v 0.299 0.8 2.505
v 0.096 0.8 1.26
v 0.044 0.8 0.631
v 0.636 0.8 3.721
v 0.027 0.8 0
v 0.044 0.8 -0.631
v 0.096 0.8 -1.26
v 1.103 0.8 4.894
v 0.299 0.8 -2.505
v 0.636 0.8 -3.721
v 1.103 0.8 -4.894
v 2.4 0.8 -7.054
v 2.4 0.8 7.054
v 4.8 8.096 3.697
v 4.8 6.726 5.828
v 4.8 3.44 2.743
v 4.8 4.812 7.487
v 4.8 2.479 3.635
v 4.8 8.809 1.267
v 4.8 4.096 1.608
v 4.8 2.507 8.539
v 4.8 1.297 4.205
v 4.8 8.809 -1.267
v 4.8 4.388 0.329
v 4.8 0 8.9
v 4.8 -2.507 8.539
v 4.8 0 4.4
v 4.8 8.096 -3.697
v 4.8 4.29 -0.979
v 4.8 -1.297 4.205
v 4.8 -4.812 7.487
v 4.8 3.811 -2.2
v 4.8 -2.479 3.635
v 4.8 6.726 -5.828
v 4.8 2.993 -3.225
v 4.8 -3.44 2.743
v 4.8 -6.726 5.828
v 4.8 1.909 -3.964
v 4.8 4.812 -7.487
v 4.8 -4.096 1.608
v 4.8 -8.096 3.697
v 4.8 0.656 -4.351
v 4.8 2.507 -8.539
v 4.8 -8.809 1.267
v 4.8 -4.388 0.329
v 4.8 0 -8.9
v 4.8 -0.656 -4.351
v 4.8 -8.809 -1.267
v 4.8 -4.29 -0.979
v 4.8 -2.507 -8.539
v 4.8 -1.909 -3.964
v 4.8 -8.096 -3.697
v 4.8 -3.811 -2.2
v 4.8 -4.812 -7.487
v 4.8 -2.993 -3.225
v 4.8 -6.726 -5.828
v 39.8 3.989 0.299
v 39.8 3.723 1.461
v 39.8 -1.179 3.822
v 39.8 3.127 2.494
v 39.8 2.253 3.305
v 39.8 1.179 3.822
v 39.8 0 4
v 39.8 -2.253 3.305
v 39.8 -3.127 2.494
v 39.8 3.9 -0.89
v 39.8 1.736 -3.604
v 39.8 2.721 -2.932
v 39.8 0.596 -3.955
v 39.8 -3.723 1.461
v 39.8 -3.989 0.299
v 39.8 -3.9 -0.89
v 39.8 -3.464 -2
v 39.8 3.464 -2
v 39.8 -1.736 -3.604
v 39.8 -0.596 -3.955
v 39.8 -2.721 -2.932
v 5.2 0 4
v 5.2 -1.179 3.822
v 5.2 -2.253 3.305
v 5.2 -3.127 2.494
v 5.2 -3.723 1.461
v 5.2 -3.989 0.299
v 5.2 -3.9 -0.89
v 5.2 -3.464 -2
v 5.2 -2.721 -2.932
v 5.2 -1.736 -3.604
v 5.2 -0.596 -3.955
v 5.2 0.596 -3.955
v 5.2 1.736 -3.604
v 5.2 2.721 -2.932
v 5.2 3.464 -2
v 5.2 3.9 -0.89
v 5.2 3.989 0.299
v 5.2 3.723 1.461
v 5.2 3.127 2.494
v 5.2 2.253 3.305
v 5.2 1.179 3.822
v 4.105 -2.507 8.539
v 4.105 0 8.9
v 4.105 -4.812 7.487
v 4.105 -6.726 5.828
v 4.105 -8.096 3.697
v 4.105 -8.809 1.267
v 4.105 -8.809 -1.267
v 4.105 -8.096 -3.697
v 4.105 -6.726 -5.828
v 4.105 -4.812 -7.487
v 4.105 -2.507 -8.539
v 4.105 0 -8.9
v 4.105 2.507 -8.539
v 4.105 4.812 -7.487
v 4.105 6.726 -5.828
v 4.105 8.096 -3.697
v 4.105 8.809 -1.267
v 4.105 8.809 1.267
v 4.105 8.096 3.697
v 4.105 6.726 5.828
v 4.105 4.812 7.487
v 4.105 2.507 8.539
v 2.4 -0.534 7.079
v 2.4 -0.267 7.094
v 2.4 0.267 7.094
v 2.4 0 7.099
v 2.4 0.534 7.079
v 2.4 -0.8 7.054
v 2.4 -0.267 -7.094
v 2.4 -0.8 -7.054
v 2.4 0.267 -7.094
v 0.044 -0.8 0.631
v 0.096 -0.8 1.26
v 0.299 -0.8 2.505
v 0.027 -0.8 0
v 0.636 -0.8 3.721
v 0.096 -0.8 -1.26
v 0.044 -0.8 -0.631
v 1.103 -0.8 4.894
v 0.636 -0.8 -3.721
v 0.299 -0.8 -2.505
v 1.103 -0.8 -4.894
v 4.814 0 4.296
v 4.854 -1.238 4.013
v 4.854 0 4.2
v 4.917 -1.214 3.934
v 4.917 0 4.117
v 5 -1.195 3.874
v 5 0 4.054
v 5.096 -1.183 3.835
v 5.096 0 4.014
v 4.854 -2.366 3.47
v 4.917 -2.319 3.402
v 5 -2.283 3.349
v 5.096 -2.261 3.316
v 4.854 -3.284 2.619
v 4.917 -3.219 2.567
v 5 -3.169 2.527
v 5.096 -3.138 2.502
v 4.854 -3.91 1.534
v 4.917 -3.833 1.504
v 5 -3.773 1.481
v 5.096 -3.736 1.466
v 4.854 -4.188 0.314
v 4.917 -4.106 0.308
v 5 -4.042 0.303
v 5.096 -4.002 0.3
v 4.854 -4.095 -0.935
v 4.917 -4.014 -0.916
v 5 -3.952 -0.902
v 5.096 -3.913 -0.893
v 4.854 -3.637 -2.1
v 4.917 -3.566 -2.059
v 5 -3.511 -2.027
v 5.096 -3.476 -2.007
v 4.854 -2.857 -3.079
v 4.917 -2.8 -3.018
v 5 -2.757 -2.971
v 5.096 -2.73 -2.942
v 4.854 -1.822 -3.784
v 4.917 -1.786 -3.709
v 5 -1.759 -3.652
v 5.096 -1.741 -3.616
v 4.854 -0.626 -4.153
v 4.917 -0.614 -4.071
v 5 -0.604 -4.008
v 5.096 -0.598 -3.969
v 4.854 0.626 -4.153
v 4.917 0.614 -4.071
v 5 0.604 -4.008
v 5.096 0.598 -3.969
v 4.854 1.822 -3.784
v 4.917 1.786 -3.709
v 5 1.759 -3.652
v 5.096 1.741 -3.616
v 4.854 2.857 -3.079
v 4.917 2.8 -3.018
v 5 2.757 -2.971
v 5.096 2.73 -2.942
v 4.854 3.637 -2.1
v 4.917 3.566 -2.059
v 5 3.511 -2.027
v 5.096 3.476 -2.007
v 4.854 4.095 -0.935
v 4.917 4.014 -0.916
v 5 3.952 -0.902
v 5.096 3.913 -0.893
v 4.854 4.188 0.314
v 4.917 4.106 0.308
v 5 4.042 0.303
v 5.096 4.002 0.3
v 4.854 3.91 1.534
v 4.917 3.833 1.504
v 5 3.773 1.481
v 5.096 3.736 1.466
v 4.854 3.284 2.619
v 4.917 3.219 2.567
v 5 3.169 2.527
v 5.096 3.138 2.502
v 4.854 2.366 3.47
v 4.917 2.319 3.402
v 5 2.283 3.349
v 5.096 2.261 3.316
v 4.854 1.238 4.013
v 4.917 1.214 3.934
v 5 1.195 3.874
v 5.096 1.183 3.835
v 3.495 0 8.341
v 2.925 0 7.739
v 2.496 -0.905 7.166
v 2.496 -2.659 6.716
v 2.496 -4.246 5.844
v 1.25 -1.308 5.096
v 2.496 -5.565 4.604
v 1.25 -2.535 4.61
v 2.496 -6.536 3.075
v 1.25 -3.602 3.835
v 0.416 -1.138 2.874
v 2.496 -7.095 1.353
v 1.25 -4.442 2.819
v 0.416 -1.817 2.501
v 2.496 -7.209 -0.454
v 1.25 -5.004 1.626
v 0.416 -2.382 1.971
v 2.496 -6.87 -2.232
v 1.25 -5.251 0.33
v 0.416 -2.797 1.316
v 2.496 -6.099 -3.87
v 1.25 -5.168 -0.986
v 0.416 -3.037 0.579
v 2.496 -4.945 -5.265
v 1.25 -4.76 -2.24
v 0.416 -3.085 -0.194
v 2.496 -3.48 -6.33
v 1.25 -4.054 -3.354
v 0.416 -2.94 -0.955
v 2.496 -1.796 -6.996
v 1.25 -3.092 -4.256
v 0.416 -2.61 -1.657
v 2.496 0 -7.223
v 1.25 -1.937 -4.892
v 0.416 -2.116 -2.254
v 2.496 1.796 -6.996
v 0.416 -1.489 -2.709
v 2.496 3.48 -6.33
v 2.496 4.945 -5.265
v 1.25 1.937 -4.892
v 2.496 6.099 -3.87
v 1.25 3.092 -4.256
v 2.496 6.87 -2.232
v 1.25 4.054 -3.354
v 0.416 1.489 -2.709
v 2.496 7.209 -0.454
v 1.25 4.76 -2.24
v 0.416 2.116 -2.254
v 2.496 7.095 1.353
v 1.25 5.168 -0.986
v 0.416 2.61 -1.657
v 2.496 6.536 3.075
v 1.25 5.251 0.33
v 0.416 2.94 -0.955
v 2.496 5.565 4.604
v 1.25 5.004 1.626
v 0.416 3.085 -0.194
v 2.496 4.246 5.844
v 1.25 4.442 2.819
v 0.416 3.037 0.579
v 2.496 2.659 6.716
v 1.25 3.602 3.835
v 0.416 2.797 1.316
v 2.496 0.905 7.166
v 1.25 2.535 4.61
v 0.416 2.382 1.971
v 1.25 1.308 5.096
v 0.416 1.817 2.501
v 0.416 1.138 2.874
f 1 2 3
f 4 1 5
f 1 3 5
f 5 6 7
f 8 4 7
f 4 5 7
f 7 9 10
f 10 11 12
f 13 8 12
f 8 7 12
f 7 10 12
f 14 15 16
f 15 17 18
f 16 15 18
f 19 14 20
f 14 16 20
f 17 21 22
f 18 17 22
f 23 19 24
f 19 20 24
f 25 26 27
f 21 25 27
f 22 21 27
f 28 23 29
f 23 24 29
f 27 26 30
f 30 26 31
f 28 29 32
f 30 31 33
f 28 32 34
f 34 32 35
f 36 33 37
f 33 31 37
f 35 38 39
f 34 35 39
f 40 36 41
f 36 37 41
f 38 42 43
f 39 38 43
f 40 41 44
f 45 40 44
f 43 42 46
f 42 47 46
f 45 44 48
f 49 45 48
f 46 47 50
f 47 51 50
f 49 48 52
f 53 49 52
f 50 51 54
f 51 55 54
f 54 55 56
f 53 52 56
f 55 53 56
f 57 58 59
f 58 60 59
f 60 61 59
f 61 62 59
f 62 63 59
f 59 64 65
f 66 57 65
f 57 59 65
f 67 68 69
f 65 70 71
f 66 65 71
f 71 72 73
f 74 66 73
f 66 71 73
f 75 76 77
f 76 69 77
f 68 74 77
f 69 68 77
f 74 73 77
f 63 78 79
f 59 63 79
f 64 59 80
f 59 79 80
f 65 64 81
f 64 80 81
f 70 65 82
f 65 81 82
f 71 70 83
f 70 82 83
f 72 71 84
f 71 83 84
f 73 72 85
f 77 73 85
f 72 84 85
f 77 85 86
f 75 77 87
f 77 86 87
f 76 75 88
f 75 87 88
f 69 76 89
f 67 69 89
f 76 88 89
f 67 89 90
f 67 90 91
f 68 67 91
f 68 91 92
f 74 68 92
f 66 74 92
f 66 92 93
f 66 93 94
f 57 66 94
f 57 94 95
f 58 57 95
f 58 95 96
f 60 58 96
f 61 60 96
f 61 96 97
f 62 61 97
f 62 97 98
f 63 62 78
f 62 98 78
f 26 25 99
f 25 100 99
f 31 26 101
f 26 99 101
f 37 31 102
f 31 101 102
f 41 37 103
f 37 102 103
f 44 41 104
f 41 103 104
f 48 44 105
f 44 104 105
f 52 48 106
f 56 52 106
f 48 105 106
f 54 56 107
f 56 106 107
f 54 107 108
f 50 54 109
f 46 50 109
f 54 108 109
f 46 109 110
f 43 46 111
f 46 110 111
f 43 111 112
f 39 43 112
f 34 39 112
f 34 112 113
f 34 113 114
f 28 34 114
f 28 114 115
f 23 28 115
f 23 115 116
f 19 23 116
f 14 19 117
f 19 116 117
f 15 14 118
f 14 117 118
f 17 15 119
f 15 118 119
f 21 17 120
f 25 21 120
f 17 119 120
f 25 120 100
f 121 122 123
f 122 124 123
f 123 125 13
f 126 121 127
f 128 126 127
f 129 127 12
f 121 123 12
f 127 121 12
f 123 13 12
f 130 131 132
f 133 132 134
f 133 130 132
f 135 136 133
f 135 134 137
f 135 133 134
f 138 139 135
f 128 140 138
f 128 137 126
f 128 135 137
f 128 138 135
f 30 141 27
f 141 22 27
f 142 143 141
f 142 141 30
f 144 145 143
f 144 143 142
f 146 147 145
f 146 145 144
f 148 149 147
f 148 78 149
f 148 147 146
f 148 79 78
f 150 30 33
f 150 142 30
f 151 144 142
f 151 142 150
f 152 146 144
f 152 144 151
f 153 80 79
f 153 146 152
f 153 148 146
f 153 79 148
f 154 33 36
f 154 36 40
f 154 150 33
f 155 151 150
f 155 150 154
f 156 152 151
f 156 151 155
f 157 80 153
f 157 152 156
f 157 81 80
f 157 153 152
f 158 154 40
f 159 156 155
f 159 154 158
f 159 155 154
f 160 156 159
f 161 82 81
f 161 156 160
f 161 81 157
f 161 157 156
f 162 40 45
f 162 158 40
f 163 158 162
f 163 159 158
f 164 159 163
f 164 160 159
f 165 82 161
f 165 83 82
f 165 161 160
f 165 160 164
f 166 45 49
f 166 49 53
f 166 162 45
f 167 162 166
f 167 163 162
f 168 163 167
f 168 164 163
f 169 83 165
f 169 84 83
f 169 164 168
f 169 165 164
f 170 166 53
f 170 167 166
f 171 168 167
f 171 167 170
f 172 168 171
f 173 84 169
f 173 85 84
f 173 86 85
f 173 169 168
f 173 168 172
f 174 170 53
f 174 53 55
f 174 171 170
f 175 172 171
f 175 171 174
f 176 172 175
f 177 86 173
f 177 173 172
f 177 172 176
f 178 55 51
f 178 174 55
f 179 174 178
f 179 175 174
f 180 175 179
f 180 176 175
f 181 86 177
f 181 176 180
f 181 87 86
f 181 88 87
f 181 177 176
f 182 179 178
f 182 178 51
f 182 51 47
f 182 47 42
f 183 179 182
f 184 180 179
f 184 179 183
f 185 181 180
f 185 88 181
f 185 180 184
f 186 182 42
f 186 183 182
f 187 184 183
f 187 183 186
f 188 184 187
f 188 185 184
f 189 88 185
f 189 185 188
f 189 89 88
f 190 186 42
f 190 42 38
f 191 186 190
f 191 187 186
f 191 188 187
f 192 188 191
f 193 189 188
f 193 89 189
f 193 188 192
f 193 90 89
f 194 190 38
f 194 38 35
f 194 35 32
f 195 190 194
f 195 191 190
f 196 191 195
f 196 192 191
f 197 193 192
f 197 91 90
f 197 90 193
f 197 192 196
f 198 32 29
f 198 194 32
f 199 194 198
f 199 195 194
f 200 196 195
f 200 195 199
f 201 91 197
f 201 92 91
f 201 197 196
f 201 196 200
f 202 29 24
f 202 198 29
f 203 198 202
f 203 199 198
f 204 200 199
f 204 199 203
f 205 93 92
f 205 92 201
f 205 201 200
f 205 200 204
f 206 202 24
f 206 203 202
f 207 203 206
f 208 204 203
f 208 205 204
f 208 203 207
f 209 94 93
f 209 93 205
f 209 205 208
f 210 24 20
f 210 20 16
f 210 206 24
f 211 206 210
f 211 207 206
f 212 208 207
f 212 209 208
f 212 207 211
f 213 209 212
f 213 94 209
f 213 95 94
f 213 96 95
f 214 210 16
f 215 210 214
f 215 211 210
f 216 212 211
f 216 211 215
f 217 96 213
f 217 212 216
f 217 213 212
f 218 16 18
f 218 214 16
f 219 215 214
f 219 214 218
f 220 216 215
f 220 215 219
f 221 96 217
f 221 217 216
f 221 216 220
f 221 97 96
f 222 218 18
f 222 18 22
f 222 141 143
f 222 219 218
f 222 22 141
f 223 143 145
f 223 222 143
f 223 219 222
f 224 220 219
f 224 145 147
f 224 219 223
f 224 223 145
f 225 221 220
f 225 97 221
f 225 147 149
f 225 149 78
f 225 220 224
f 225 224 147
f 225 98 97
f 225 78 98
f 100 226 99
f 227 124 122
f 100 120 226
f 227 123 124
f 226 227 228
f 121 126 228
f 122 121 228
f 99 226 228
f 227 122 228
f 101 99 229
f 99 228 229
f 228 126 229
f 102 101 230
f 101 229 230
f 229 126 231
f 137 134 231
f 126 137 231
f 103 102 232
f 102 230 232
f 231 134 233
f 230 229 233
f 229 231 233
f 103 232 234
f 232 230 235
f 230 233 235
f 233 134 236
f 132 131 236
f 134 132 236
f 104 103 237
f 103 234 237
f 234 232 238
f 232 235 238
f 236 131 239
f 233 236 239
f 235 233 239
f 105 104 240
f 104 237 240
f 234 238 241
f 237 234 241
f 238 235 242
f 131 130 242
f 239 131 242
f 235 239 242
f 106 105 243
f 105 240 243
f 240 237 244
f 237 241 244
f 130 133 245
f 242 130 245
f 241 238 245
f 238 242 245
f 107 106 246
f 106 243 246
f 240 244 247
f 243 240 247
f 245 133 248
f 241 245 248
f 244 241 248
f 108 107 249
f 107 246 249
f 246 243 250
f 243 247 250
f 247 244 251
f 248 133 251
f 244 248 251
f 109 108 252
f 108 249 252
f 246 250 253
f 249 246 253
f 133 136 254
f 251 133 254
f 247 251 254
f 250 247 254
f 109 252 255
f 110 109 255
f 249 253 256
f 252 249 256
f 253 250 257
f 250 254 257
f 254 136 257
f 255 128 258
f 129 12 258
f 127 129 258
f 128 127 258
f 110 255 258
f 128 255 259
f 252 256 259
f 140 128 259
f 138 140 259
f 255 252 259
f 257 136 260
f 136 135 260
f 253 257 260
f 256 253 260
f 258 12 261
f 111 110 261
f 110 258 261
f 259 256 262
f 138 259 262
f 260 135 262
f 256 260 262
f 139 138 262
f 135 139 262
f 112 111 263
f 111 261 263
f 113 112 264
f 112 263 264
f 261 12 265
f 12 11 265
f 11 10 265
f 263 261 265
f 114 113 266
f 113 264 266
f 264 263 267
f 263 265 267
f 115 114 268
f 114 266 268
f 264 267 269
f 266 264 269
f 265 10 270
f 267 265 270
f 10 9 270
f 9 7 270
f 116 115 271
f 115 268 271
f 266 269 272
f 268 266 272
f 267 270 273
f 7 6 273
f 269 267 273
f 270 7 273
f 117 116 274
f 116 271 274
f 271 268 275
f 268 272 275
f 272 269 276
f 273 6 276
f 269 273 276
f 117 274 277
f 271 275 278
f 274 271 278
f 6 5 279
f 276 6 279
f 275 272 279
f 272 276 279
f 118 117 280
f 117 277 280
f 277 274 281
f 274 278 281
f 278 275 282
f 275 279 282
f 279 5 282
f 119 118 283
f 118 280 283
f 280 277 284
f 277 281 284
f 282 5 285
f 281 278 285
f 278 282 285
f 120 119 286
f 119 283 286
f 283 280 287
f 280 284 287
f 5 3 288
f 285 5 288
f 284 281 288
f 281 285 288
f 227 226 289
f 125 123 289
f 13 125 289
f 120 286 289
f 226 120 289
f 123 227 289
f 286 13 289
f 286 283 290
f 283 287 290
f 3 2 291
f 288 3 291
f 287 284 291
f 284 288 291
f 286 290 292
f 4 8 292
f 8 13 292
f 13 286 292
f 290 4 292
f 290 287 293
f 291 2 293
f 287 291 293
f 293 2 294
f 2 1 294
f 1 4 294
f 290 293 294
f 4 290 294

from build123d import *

# Parameters (mm, degrees)
FILLET1_R  = 0.4
SKETCH2_W  = 17.8
SKETCH2_H  = 1.6
SLOT_DEPTH = 2.4


with BuildPart() as part:
    # BodySke → Base-Revolve (revolve)
    with BuildSketch(Plane.XY, mode=Mode.PRIVATE) as base_revolve_sk:
        with BuildLine():
            Line((4.8, 4), (4.8, 8.9))
            Line((4.8, 8.9), (4.105264982, 8.9))
            ThreePointArc((4.105264982, 8.9), (1.075772976, 4.900591816), (0, 0))
            Line((0, 0), (39.8, 0))
            Line((39.8, 0), (39.8, 4))
            Line((39.8, 4), (4.8, 4))
        make_face()
    revolve(base_revolve_sk.sketch.rotate(Axis((-25.4, 0, 0), (1, 0, 0)), 90), axis=Axis((-25.4, 0, 0), (1, 0, 0)))

    # Fillet1
    fillet1_edges = [part.edges().sort_by_distance(p)[0] for p in [
        (4.8, 0, -4),
    ]]
    fillet(fillet1_edges, radius=FILLET1_R)

    # Sketch2 → Slot (cut)
    with BuildSketch(Plane(origin=(0, 0, 0), x_dir=(0, 0, -1), z_dir=(1, 0, 0))):
        Rectangle(SKETCH2_W, SKETCH2_H)
    extrude(amount=SLOT_DEPTH, mode=Mode.SUBTRACT)


solid = part.part
